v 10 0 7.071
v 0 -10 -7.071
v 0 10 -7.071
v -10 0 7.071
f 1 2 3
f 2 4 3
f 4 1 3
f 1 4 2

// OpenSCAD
module tetrahedron(scl) {
    scale(scl)
	polyhedron ( points = [
			 [ 0, 1,-sqrt(2)/2],
                         [ 0,-1,-sqrt(2)/2],
                         [ 1, 0, sqrt(2)/2],
                         [-1, 0, sqrt(2)/2]
                         ],
                 faces = [[0,1,2],
                          [0,3,1],
                          [0,2,3],
                          [1,3,2]]
             );
};
tetrahedron(10);
